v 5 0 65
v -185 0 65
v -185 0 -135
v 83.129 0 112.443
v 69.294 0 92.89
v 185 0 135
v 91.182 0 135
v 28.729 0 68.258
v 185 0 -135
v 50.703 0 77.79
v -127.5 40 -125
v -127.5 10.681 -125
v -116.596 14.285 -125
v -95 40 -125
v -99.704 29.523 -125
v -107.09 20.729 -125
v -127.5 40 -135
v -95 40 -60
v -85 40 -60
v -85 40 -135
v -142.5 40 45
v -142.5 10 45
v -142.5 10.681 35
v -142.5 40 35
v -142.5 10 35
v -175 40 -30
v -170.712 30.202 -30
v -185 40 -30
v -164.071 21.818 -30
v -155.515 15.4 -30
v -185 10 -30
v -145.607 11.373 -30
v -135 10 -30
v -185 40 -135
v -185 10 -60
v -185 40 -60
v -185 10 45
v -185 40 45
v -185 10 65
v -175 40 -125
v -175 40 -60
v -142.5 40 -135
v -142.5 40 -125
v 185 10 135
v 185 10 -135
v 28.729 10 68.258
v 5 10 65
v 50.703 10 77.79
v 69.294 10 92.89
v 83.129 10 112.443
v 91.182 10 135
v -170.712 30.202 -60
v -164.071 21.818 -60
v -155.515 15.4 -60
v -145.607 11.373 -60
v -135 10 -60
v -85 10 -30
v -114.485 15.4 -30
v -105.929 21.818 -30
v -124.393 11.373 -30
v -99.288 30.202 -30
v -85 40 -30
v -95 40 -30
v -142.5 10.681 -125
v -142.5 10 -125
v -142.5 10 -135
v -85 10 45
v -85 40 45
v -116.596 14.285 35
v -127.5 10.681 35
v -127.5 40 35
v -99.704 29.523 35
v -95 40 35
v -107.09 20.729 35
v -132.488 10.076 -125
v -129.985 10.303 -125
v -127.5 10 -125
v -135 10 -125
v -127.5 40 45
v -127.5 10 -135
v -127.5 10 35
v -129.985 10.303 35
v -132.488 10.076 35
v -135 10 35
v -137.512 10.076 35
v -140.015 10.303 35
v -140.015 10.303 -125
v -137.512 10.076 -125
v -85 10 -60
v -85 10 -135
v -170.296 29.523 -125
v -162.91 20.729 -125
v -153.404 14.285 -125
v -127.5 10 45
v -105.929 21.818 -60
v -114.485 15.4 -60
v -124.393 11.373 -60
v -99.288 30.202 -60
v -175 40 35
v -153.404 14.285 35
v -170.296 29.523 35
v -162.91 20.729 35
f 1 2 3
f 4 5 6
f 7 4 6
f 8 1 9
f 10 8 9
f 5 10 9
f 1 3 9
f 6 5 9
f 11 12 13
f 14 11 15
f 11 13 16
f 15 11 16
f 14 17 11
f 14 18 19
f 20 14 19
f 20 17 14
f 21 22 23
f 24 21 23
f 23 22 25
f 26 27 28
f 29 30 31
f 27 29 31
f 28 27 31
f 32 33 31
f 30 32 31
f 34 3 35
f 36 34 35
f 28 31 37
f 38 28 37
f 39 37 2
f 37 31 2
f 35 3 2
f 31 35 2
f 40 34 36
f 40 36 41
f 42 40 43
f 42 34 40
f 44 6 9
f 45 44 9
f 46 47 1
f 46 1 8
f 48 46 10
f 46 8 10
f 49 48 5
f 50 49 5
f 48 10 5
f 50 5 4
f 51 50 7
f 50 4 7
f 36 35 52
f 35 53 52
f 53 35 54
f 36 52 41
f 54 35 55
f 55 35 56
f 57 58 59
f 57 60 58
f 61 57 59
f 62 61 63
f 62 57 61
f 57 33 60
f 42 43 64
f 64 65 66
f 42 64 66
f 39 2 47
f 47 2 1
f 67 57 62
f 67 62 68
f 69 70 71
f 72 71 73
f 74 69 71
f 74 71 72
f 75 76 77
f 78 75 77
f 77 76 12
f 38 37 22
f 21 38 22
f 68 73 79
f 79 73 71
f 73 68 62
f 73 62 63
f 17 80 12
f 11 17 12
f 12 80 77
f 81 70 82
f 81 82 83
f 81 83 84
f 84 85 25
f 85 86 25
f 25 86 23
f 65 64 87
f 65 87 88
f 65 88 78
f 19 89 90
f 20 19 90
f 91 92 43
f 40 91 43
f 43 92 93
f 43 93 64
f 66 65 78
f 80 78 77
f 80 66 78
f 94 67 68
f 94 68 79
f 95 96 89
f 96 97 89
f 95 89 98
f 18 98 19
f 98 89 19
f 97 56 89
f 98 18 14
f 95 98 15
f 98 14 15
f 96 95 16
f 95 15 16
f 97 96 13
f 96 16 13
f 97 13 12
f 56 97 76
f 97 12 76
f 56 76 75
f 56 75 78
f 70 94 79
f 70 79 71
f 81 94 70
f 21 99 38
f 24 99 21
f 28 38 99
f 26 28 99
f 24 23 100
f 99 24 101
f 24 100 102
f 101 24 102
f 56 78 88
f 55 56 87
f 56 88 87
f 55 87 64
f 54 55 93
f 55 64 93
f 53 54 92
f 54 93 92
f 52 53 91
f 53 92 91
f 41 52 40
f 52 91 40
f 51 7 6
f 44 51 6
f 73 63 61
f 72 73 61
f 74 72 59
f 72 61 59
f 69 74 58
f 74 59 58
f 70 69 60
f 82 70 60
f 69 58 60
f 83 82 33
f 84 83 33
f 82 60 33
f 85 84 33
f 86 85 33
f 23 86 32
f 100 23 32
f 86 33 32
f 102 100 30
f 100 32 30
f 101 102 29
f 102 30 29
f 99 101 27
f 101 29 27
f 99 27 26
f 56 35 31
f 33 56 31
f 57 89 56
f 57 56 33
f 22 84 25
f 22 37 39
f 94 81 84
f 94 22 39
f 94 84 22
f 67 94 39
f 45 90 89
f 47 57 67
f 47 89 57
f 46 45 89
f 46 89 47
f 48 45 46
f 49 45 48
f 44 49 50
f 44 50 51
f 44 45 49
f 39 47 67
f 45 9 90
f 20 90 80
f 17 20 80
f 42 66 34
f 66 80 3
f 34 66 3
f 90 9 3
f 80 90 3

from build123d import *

# Parameters (mm, degrees)
BOSS_EXTRUDE1_DEPTH     = 10
BOSS_EXTRUDE2_DEPTH     = 30
BOSS_EXTRUDE3_REACH     = 323.598
CUT_EXTRUDE1_DEPTH      = 396.885084336
CUT_EXTRUDE1_DEPTH_BACK = 396.885084336
SKETCH5_W               = 30
SKETCH5_H               = 30


with BuildPart() as part:
    # Sketch1 → Boss-Extrude1 (new body)
    with BuildSketch(Plane(origin=(0, 0, 0), x_dir=(1, 0, 0), z_dir=(0, 1, 0))):
        with BuildLine():
            Line((-185, -65), (5, -65))
            ThreePointArc((5, -65), (60.514401442, -84.704810384), (91.182336182, -135))
            Line((91.182336182, -135), (185, -135))
            Line((185, -135), (185, 135))
            Line((185, 135), (-185, 135))
            Line((-185, 135), (-185, -65))
        make_face()
    extrude(amount=BOSS_EXTRUDE1_DEPTH)

    # Sketch2 → Boss-Extrude2 (add)
    with BuildSketch(Plane(origin=(0, 10, 0), x_dir=(1, 0, 0), z_dir=(0, 1, 0))):
        Polygon((-175, -35), (-175, 30), (-185, 30), (-185, -45), (-142.5, -45), (-142.5, -35), align=None)
        Polygon((-175, 125), (-142.5, 125), (-142.5, 135), (-185, 135), (-185, 60), (-175, 60), align=None)
        Polygon((-95, -35), (-95, 30), (-85, 30), (-85, -45), (-127.5, -45), (-127.5, -35), align=None)
        Polygon((-127.5, 135), (-127.5, 125), (-95, 125), (-95, 60), (-85, 60), (-85, 135), align=None)
    extrude(amount=BOSS_EXTRUDE2_DEPTH)

    # Boss-Extrude3: up to this face of the body (flat: up to its plane)
    boss_extrude3_end = Plane(part.part.faces().sort_by_distance((-158.75, 25, 35))[0])
    # Sketch3 → Boss-Extrude3 (add, up to the picked face)
    with BuildSketch(Plane.XY.offset(-125), mode=Mode.PRIVATE) as boss_extrude3_sk1:
        with BuildLine():
            ThreePointArc((-134.999999946, 10), (-159.999999978, 18.333333317), (-175, 40))
            Line((-175, 40), (-175, 10))
            Line((-175, 10), (-134.999999946, 10))
        make_face()
    boss_extrude3_tool1 = split(extrude(boss_extrude3_sk1.sketch, amount=BOSS_EXTRUDE3_REACH, mode=Mode.PRIVATE), bisect_by=boss_extrude3_end, keep=Keep.BOTH, mode=Mode.PRIVATE)
    # Sketch3 → Boss-Extrude3 (add, up to the picked face)
    with BuildSketch(Plane.XY.offset(-125), mode=Mode.PRIVATE) as boss_extrude3_sk2:
        with BuildLine():
            Line((-134.999999946, 10), (-95, 10))
            Line((-95, 10), (-95, 40))
            ThreePointArc((-95, 40), (-109.999999978, 18.33333335), (-134.999999946, 10))
        make_face()
    boss_extrude3_tool2 = split(extrude(boss_extrude3_sk2.sketch, amount=BOSS_EXTRUDE3_REACH, mode=Mode.PRIVATE), bisect_by=boss_extrude3_end, keep=Keep.BOTH, mode=Mode.PRIVATE)
    add(boss_extrude3_tool1.solids().sort_by(Axis((-165.840385, 17.926758, -125), (0, 0, 1)))[0])
    add(boss_extrude3_tool2.solids().sort_by(Axis((-104.159615, 17.926758, -125), (0, 0, 1)))[0])

    # Sketch5 → Cut-Extrude1 (cut, two sides: drawn at the far end of the back side and taken through both)
    with BuildSketch(Plane.ZY.offset(185).offset(-CUT_EXTRUDE1_DEPTH_BACK)):
        with Locations((-45, 25)):
            Rectangle(SKETCH5_W, SKETCH5_H)
    extrude(amount=CUT_EXTRUDE1_DEPTH + CUT_EXTRUDE1_DEPTH_BACK, mode=Mode.SUBTRACT)


solid = part.part
